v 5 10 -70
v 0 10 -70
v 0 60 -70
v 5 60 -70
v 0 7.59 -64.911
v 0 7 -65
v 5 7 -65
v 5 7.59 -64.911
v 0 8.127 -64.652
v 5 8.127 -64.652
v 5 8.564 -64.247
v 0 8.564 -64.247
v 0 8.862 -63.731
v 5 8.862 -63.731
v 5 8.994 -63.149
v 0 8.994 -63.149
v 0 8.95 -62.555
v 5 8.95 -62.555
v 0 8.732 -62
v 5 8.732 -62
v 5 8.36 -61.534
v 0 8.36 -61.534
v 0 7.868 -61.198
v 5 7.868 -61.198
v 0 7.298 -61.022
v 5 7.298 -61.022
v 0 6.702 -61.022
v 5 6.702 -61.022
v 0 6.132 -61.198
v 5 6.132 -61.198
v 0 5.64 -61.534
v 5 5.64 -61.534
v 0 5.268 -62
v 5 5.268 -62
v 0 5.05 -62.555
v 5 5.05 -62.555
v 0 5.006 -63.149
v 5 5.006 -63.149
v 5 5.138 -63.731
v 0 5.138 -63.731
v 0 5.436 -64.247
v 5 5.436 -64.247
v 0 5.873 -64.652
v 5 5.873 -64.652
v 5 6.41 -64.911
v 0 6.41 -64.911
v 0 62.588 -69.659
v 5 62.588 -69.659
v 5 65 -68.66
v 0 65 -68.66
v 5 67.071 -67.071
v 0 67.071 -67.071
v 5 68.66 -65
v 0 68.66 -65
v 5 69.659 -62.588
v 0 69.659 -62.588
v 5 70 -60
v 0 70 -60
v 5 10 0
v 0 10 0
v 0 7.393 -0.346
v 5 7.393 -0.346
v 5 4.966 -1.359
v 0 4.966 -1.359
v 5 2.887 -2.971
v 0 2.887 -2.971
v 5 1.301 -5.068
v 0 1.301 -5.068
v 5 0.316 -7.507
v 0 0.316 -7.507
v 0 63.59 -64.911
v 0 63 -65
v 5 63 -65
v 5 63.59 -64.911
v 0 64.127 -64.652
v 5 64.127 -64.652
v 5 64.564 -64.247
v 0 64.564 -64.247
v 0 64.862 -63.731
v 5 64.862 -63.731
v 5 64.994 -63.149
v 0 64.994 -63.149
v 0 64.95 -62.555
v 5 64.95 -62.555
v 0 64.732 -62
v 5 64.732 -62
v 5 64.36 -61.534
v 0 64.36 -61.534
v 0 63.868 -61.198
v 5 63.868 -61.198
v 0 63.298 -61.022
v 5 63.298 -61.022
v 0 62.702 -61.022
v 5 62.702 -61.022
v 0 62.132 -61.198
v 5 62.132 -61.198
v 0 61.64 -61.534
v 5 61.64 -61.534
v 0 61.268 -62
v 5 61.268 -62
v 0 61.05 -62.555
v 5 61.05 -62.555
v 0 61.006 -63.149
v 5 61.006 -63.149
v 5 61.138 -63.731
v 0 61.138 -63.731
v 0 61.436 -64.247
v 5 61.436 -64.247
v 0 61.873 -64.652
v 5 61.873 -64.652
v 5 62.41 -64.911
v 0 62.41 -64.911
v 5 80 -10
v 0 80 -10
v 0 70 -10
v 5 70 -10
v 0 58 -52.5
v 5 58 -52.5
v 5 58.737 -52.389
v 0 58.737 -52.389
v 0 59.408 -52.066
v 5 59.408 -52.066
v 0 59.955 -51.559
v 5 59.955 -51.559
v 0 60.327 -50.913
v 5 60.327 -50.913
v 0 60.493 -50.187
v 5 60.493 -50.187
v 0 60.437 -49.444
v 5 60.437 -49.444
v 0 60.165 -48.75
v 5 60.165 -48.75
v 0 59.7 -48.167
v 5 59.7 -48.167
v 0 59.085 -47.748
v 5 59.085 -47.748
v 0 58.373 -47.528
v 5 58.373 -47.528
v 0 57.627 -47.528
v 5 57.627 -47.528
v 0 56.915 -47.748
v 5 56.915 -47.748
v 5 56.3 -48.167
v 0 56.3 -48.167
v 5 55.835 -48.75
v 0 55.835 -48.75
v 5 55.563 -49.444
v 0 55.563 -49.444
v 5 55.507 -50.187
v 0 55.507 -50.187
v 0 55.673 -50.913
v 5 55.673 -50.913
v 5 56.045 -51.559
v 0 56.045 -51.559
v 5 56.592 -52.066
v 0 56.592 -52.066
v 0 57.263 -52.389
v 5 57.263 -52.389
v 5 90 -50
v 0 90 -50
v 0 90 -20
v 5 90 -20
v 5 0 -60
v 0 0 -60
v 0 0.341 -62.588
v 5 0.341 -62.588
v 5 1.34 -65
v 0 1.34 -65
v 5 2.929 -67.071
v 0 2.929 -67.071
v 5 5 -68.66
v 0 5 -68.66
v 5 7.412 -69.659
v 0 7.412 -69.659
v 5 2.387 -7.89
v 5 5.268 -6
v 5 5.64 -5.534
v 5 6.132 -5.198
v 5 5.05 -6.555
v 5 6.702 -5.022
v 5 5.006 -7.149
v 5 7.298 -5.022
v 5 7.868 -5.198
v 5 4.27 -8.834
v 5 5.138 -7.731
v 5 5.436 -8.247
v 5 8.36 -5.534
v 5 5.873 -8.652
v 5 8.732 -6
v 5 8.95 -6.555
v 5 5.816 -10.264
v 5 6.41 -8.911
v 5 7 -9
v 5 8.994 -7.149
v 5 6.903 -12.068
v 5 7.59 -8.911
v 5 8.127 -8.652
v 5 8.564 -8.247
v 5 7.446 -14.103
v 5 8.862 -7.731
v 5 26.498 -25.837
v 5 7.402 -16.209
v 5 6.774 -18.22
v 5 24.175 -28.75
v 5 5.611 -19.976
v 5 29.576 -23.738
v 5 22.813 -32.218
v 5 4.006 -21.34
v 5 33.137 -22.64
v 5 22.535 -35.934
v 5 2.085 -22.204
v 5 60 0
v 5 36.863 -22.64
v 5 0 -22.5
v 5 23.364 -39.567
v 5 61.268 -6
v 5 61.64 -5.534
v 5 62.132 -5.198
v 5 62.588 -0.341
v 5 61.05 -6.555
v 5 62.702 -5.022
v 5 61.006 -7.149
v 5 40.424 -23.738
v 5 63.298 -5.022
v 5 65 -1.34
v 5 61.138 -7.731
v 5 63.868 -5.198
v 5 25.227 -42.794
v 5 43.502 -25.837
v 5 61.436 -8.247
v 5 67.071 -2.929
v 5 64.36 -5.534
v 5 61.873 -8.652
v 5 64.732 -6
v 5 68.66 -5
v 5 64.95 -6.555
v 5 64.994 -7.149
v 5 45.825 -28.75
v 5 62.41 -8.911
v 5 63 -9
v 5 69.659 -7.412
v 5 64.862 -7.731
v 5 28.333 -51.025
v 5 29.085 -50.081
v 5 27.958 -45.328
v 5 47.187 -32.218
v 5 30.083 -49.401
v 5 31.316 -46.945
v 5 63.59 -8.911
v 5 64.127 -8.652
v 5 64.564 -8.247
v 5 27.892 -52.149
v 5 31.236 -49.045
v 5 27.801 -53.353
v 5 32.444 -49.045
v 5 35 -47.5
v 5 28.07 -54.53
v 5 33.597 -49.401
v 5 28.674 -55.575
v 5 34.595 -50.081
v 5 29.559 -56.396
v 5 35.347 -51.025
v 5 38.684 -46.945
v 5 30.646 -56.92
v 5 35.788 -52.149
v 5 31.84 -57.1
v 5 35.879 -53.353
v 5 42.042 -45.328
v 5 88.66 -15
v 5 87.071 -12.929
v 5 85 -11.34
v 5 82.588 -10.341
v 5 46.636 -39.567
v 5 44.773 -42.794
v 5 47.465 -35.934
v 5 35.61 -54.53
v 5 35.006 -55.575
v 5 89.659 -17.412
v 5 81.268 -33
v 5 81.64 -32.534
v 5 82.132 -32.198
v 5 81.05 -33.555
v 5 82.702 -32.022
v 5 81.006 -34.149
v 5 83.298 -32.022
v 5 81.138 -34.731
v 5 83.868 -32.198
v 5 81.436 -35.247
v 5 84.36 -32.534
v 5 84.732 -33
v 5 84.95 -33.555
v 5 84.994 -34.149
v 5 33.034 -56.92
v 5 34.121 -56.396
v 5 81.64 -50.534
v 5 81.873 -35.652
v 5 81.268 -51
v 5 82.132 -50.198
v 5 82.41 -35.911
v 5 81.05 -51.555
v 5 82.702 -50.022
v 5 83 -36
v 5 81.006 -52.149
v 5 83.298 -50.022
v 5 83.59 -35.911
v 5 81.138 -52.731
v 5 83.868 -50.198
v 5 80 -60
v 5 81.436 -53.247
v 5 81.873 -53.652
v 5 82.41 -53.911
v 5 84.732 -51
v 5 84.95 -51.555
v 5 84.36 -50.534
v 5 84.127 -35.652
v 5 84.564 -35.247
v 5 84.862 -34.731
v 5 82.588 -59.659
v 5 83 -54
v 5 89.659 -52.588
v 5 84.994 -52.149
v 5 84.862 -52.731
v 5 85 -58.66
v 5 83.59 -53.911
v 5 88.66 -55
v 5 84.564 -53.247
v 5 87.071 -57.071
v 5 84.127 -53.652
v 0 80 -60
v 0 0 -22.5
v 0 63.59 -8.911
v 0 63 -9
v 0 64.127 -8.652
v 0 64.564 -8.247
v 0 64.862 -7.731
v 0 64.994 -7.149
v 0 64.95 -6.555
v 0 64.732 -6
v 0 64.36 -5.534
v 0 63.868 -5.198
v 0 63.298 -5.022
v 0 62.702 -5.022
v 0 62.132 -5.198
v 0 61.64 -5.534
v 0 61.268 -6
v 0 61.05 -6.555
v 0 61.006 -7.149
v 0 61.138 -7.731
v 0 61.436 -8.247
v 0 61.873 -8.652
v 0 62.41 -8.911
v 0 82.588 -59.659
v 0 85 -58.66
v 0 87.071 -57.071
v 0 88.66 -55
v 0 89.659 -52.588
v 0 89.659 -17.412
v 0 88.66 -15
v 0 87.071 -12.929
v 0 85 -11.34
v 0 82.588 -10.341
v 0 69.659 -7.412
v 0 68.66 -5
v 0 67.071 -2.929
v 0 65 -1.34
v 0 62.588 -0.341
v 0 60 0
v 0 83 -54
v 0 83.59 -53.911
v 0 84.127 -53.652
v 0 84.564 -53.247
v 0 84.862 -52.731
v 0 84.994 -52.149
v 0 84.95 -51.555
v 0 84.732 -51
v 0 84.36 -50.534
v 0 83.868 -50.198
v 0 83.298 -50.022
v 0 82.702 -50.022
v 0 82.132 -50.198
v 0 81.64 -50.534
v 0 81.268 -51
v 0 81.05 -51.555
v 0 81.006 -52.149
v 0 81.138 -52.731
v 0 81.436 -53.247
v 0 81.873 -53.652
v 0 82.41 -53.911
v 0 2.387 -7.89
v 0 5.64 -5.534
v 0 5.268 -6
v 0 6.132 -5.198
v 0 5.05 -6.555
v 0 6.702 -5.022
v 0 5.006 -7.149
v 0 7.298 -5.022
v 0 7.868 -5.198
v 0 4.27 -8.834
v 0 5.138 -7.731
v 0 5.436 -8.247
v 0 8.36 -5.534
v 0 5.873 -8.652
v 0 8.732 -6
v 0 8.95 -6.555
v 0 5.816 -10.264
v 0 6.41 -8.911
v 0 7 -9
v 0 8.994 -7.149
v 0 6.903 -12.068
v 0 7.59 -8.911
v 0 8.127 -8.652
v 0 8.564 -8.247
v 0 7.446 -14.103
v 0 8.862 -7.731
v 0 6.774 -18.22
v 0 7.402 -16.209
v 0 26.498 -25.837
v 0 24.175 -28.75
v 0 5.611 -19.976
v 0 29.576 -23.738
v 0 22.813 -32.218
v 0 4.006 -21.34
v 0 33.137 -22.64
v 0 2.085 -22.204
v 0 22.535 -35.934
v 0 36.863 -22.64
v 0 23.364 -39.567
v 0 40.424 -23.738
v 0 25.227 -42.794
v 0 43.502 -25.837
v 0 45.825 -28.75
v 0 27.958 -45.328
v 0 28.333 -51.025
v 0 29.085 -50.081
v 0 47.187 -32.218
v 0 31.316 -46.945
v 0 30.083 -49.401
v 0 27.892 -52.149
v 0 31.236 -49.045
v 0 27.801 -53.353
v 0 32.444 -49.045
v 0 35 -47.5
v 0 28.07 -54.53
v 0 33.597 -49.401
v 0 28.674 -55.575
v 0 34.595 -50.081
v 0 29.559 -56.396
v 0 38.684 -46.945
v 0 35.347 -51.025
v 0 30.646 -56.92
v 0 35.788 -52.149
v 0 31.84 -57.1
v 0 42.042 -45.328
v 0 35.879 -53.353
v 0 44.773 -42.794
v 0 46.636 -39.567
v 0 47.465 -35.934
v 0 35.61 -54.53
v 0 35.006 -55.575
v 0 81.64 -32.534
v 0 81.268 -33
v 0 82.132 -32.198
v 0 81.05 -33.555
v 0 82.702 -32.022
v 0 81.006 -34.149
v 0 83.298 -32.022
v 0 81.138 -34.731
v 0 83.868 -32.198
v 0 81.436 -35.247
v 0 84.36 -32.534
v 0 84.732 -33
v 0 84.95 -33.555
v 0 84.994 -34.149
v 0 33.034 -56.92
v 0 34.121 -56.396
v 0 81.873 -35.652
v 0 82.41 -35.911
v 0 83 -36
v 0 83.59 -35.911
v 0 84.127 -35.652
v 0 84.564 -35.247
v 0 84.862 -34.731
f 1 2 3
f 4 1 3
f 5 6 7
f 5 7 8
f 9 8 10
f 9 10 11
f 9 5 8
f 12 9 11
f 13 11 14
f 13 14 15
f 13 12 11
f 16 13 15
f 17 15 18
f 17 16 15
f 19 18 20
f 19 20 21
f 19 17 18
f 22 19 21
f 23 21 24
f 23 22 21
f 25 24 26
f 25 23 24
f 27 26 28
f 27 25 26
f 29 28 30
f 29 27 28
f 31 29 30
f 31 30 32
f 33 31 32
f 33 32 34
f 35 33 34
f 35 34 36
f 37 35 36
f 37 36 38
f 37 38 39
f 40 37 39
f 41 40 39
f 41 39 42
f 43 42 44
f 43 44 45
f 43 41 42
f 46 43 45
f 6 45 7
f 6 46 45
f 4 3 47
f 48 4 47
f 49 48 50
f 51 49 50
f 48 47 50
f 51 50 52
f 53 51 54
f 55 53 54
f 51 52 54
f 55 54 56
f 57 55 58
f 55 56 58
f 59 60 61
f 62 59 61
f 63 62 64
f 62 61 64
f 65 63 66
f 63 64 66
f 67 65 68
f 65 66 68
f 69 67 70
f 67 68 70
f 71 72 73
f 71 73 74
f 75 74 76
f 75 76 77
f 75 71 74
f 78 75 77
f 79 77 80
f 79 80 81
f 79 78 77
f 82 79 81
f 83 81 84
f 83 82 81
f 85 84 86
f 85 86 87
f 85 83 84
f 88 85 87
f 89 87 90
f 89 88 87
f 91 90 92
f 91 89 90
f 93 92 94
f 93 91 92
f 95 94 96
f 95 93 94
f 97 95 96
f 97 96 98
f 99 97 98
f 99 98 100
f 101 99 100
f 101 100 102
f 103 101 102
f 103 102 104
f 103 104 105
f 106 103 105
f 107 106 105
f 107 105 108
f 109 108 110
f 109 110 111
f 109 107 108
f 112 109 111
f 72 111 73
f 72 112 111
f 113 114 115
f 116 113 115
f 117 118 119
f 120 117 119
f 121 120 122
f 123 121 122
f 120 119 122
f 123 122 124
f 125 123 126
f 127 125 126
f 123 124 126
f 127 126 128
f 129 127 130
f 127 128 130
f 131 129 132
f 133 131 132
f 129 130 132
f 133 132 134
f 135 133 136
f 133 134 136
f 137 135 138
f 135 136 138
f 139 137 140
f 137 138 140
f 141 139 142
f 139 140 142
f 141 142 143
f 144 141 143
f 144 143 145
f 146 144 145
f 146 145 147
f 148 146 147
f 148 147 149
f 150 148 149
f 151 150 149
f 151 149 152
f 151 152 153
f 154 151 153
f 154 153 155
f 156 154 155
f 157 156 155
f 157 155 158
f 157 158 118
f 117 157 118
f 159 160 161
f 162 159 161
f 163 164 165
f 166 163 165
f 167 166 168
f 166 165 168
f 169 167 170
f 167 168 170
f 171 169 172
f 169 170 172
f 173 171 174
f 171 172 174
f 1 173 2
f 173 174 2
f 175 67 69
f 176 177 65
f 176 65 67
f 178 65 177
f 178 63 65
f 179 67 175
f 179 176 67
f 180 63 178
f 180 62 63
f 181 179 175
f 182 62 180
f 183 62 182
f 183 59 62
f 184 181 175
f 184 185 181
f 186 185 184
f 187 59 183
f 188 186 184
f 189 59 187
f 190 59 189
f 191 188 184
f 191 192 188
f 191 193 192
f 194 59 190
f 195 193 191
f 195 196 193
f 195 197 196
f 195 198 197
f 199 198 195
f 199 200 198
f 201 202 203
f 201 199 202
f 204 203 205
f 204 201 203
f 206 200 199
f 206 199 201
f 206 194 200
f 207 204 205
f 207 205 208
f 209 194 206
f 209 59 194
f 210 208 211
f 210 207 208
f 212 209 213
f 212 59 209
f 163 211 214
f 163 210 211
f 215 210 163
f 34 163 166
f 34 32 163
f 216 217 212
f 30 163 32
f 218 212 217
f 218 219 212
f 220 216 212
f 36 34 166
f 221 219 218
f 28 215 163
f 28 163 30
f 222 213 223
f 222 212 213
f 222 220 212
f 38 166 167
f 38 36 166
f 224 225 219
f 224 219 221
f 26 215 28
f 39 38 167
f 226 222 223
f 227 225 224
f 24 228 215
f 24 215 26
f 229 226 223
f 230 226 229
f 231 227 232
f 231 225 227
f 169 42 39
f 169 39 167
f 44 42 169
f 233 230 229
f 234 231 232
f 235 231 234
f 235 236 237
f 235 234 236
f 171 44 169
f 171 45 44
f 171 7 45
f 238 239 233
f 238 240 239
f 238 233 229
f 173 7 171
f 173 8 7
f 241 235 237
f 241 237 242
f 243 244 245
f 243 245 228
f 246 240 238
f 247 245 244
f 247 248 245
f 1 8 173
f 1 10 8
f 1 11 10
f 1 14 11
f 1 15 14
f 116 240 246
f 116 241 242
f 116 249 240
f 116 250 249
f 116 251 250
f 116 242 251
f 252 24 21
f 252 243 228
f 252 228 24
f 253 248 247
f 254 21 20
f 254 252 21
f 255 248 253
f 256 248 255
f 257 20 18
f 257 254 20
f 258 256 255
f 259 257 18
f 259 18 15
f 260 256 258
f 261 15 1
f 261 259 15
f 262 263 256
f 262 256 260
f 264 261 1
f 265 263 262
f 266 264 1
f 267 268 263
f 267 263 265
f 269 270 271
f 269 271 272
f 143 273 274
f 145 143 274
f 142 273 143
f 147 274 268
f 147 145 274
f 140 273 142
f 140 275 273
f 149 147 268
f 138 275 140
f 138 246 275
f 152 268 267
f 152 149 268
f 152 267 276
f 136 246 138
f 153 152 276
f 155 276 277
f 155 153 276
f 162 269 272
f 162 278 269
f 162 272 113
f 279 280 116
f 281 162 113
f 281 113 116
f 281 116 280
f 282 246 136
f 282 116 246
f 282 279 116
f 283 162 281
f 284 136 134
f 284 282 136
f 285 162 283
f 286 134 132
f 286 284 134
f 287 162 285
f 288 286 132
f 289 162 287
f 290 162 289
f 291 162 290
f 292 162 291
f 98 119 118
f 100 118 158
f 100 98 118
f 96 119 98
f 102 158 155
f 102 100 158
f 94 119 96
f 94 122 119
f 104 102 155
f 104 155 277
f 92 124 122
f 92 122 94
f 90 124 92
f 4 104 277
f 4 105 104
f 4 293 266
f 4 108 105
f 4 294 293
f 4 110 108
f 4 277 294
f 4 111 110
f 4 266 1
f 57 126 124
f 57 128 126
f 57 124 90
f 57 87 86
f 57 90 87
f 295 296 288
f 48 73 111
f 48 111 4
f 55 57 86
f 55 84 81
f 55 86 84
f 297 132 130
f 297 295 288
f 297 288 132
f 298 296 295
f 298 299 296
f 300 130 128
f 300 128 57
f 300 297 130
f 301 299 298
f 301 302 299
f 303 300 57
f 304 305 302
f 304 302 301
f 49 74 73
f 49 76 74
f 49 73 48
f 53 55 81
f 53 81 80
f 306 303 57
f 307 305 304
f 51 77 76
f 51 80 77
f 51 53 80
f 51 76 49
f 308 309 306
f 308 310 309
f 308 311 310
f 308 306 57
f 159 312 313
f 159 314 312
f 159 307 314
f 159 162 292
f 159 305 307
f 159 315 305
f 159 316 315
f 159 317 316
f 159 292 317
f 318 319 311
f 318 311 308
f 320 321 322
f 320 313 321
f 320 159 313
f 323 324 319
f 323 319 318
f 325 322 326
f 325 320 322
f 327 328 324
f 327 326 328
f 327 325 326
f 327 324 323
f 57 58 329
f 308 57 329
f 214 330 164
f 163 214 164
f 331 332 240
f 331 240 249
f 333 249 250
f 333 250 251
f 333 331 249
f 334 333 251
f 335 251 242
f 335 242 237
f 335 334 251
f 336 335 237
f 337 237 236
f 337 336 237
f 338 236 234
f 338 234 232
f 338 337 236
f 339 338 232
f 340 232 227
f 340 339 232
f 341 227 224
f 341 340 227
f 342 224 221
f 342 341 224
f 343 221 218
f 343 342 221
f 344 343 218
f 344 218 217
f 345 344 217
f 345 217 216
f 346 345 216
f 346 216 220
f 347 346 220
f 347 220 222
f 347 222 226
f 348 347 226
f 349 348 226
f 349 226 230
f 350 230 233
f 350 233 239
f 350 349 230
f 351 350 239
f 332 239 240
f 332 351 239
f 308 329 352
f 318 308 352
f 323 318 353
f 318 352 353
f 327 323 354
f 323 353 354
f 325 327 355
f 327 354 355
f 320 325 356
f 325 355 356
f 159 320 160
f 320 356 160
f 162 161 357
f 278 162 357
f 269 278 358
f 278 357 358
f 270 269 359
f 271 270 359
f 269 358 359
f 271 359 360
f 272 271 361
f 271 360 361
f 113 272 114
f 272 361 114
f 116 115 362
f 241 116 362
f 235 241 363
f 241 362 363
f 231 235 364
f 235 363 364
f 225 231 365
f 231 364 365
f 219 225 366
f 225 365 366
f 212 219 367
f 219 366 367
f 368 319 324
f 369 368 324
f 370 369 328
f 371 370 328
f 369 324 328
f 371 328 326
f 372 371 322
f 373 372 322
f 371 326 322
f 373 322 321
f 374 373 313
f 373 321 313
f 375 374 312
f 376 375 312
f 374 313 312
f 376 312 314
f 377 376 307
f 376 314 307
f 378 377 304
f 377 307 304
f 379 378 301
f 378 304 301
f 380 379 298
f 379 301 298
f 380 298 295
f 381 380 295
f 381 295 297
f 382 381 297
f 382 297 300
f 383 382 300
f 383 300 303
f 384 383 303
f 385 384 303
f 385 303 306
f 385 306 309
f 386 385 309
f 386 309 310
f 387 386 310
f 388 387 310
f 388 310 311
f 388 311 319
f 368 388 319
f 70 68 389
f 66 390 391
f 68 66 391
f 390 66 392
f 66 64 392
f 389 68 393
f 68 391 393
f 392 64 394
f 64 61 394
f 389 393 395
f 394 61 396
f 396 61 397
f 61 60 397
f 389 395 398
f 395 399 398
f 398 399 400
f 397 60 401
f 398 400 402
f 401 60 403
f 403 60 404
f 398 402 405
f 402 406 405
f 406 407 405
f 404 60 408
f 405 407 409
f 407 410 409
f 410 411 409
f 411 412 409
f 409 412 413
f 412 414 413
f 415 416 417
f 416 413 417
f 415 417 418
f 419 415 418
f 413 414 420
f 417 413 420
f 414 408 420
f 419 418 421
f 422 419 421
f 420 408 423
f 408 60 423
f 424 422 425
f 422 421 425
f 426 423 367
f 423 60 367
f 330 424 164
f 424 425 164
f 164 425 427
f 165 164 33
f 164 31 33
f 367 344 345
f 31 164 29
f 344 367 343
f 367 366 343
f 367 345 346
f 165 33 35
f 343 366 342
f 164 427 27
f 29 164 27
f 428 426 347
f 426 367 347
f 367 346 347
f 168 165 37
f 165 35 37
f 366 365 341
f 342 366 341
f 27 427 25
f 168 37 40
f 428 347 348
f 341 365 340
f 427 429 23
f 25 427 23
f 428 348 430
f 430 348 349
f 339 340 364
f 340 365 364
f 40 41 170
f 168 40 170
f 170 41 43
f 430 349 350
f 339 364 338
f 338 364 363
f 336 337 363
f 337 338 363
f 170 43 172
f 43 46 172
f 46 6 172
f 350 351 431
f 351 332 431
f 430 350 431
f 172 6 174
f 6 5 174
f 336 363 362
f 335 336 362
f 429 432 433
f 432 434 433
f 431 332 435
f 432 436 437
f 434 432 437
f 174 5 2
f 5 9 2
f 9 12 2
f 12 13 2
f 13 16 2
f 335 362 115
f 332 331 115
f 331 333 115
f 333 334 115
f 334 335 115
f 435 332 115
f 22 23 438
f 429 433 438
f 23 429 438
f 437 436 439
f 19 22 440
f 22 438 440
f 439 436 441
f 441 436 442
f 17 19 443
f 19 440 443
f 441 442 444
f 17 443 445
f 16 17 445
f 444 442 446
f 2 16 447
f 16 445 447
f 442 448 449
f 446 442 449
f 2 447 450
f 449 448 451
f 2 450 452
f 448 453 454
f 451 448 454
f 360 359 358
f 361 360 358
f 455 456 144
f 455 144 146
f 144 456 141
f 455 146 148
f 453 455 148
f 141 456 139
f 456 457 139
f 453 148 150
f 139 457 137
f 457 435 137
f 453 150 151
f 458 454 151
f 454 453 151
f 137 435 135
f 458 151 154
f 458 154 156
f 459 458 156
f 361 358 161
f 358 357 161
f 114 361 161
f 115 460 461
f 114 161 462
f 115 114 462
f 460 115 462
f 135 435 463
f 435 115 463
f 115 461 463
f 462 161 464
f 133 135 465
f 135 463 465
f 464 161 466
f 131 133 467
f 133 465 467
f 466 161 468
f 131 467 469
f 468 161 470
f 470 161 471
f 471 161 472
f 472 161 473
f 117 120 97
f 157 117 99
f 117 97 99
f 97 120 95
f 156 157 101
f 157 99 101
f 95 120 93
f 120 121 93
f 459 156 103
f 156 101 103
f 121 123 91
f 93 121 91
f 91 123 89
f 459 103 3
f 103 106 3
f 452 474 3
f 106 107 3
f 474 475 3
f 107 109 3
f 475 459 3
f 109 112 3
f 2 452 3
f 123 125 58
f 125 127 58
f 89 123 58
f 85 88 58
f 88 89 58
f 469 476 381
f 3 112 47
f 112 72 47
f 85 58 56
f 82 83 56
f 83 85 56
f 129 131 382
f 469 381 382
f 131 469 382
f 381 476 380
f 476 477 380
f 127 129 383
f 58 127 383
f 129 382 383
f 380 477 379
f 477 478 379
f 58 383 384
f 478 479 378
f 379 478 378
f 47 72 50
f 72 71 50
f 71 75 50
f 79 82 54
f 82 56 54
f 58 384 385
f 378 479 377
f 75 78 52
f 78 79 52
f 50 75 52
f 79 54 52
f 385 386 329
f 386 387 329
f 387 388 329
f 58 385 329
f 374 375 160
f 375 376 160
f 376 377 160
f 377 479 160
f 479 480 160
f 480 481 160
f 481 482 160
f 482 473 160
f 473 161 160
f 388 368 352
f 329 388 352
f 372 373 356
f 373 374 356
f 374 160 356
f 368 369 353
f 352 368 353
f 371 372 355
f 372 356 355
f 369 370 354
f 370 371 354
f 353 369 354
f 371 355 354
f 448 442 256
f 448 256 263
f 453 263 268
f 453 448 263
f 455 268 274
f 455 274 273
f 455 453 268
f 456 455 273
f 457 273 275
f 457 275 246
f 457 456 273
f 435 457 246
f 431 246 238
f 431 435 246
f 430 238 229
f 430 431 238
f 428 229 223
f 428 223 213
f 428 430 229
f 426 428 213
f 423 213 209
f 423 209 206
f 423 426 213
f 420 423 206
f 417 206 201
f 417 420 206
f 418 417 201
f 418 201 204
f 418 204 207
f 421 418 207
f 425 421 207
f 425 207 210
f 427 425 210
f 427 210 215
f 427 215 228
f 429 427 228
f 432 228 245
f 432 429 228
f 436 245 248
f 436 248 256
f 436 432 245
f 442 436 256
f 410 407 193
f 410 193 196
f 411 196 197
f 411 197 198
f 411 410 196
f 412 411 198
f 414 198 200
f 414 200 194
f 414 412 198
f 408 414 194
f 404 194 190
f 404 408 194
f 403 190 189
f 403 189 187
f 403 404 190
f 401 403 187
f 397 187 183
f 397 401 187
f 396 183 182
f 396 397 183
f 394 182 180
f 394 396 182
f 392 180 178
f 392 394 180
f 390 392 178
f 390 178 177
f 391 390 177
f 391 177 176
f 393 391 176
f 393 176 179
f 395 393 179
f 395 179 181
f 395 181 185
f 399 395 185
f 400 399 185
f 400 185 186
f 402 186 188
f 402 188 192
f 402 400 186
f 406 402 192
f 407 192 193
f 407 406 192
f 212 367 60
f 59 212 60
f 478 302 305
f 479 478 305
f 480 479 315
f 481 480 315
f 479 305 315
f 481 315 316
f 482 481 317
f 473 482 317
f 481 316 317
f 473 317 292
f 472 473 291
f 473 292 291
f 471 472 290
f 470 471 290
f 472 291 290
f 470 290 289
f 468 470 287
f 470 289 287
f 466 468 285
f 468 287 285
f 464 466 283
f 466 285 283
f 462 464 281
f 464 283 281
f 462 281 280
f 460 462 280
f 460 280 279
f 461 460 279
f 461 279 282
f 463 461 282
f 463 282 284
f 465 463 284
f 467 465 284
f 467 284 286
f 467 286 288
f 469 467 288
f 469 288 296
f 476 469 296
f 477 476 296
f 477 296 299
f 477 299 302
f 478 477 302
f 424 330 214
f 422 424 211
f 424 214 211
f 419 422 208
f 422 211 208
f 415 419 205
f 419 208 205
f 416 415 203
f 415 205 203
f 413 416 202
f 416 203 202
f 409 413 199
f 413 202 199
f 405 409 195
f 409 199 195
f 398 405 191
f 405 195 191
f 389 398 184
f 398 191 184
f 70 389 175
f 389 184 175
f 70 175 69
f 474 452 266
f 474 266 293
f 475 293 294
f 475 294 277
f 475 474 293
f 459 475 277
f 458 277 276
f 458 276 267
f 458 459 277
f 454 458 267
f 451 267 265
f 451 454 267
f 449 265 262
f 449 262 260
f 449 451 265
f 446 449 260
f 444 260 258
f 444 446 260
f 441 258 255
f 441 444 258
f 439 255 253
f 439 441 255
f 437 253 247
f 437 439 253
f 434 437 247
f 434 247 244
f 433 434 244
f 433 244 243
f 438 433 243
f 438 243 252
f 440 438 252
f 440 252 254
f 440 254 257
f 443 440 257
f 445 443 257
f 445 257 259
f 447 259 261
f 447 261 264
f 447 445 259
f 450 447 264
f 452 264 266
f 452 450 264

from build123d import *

# Parameters (mm, degrees)
CROQUIS1_R              = 2
CROQUIS1_R_2            = 4.05
CROQUIS1_R_3            = 12.5
SALIENTE_EXTRUIR1_DEPTH = 5
CROQUIS2_R              = 7.5
CROQUIS2_R_2            = 2.5
CROQUIS2_R_3            = 2
CORTAR_EXTRUIR1_DEPTH   = 10


with BuildPart() as part:
    # Croquis1 → Saliente-Extruir1 (new body)
    with BuildSketch(Plane(origin=(0, 0, 0), x_dir=(0, 0, -1), z_dir=(1, 0, 0))):
        with BuildLine():
            Line((10, 0), (60, 0))
            ThreePointArc((60, 0), (67.071067812, 2.928932188), (70, 10))
            Line((70, 10), (70, 60))
            ThreePointArc((70, 60), (67.071067812, 67.071067812), (60, 70))
            Line((60, 70), (60, 80))
            ThreePointArc((60, 80), (57.071067812, 87.071067812), (50, 90))
            Line((50, 90), (20, 90))
            ThreePointArc((20, 90), (12.928932188, 87.071067812), (10, 80))
            Line((10, 80), (10, 70))
            ThreePointArc((10, 70), (2.928932188, 67.071067812), (0, 60))
            Line((0, 60), (0, 10))
            ThreePointArc((0, 10), (2.928932188, 2.928932188), (10, 0))
        make_face()
        with Locations((7, 63)):
            Circle(CROQUIS1_R, mode=Mode.SUBTRACT)
        with Locations((63, 63)):
            Circle(CROQUIS1_R, mode=Mode.SUBTRACT)
        with Locations((63, 7)):
            Circle(CROQUIS1_R, mode=Mode.SUBTRACT)
        with Locations((7, 7)):
            Circle(CROQUIS1_R, mode=Mode.SUBTRACT)
        with Locations((53.05, 31.84)):
            Circle(CROQUIS1_R_2, mode=Mode.SUBTRACT)
        with Locations((35, 35)):
            Circle(CROQUIS1_R_3, mode=Mode.SUBTRACT)
    extrude(amount=SALIENTE_EXTRUIR1_DEPTH)

    # Croquis2 → Cortar-Extruir1 (cut)
    with BuildSketch(Plane(origin=(5, 0, 0), x_dir=(0, 0, -1), z_dir=(1, 0, 0))):
        with Locations((15, 0)):
            Circle(CROQUIS2_R)
        with Locations((50, 58)):
            Circle(CROQUIS2_R_2)
        with Locations((52, 83)):
            Circle(CROQUIS2_R_3)
        with Locations((34, 83)):
            Circle(CROQUIS2_R_3)
    extrude(amount=-CORTAR_EXTRUIR1_DEPTH, mode=Mode.SUBTRACT)


solid = part.part
